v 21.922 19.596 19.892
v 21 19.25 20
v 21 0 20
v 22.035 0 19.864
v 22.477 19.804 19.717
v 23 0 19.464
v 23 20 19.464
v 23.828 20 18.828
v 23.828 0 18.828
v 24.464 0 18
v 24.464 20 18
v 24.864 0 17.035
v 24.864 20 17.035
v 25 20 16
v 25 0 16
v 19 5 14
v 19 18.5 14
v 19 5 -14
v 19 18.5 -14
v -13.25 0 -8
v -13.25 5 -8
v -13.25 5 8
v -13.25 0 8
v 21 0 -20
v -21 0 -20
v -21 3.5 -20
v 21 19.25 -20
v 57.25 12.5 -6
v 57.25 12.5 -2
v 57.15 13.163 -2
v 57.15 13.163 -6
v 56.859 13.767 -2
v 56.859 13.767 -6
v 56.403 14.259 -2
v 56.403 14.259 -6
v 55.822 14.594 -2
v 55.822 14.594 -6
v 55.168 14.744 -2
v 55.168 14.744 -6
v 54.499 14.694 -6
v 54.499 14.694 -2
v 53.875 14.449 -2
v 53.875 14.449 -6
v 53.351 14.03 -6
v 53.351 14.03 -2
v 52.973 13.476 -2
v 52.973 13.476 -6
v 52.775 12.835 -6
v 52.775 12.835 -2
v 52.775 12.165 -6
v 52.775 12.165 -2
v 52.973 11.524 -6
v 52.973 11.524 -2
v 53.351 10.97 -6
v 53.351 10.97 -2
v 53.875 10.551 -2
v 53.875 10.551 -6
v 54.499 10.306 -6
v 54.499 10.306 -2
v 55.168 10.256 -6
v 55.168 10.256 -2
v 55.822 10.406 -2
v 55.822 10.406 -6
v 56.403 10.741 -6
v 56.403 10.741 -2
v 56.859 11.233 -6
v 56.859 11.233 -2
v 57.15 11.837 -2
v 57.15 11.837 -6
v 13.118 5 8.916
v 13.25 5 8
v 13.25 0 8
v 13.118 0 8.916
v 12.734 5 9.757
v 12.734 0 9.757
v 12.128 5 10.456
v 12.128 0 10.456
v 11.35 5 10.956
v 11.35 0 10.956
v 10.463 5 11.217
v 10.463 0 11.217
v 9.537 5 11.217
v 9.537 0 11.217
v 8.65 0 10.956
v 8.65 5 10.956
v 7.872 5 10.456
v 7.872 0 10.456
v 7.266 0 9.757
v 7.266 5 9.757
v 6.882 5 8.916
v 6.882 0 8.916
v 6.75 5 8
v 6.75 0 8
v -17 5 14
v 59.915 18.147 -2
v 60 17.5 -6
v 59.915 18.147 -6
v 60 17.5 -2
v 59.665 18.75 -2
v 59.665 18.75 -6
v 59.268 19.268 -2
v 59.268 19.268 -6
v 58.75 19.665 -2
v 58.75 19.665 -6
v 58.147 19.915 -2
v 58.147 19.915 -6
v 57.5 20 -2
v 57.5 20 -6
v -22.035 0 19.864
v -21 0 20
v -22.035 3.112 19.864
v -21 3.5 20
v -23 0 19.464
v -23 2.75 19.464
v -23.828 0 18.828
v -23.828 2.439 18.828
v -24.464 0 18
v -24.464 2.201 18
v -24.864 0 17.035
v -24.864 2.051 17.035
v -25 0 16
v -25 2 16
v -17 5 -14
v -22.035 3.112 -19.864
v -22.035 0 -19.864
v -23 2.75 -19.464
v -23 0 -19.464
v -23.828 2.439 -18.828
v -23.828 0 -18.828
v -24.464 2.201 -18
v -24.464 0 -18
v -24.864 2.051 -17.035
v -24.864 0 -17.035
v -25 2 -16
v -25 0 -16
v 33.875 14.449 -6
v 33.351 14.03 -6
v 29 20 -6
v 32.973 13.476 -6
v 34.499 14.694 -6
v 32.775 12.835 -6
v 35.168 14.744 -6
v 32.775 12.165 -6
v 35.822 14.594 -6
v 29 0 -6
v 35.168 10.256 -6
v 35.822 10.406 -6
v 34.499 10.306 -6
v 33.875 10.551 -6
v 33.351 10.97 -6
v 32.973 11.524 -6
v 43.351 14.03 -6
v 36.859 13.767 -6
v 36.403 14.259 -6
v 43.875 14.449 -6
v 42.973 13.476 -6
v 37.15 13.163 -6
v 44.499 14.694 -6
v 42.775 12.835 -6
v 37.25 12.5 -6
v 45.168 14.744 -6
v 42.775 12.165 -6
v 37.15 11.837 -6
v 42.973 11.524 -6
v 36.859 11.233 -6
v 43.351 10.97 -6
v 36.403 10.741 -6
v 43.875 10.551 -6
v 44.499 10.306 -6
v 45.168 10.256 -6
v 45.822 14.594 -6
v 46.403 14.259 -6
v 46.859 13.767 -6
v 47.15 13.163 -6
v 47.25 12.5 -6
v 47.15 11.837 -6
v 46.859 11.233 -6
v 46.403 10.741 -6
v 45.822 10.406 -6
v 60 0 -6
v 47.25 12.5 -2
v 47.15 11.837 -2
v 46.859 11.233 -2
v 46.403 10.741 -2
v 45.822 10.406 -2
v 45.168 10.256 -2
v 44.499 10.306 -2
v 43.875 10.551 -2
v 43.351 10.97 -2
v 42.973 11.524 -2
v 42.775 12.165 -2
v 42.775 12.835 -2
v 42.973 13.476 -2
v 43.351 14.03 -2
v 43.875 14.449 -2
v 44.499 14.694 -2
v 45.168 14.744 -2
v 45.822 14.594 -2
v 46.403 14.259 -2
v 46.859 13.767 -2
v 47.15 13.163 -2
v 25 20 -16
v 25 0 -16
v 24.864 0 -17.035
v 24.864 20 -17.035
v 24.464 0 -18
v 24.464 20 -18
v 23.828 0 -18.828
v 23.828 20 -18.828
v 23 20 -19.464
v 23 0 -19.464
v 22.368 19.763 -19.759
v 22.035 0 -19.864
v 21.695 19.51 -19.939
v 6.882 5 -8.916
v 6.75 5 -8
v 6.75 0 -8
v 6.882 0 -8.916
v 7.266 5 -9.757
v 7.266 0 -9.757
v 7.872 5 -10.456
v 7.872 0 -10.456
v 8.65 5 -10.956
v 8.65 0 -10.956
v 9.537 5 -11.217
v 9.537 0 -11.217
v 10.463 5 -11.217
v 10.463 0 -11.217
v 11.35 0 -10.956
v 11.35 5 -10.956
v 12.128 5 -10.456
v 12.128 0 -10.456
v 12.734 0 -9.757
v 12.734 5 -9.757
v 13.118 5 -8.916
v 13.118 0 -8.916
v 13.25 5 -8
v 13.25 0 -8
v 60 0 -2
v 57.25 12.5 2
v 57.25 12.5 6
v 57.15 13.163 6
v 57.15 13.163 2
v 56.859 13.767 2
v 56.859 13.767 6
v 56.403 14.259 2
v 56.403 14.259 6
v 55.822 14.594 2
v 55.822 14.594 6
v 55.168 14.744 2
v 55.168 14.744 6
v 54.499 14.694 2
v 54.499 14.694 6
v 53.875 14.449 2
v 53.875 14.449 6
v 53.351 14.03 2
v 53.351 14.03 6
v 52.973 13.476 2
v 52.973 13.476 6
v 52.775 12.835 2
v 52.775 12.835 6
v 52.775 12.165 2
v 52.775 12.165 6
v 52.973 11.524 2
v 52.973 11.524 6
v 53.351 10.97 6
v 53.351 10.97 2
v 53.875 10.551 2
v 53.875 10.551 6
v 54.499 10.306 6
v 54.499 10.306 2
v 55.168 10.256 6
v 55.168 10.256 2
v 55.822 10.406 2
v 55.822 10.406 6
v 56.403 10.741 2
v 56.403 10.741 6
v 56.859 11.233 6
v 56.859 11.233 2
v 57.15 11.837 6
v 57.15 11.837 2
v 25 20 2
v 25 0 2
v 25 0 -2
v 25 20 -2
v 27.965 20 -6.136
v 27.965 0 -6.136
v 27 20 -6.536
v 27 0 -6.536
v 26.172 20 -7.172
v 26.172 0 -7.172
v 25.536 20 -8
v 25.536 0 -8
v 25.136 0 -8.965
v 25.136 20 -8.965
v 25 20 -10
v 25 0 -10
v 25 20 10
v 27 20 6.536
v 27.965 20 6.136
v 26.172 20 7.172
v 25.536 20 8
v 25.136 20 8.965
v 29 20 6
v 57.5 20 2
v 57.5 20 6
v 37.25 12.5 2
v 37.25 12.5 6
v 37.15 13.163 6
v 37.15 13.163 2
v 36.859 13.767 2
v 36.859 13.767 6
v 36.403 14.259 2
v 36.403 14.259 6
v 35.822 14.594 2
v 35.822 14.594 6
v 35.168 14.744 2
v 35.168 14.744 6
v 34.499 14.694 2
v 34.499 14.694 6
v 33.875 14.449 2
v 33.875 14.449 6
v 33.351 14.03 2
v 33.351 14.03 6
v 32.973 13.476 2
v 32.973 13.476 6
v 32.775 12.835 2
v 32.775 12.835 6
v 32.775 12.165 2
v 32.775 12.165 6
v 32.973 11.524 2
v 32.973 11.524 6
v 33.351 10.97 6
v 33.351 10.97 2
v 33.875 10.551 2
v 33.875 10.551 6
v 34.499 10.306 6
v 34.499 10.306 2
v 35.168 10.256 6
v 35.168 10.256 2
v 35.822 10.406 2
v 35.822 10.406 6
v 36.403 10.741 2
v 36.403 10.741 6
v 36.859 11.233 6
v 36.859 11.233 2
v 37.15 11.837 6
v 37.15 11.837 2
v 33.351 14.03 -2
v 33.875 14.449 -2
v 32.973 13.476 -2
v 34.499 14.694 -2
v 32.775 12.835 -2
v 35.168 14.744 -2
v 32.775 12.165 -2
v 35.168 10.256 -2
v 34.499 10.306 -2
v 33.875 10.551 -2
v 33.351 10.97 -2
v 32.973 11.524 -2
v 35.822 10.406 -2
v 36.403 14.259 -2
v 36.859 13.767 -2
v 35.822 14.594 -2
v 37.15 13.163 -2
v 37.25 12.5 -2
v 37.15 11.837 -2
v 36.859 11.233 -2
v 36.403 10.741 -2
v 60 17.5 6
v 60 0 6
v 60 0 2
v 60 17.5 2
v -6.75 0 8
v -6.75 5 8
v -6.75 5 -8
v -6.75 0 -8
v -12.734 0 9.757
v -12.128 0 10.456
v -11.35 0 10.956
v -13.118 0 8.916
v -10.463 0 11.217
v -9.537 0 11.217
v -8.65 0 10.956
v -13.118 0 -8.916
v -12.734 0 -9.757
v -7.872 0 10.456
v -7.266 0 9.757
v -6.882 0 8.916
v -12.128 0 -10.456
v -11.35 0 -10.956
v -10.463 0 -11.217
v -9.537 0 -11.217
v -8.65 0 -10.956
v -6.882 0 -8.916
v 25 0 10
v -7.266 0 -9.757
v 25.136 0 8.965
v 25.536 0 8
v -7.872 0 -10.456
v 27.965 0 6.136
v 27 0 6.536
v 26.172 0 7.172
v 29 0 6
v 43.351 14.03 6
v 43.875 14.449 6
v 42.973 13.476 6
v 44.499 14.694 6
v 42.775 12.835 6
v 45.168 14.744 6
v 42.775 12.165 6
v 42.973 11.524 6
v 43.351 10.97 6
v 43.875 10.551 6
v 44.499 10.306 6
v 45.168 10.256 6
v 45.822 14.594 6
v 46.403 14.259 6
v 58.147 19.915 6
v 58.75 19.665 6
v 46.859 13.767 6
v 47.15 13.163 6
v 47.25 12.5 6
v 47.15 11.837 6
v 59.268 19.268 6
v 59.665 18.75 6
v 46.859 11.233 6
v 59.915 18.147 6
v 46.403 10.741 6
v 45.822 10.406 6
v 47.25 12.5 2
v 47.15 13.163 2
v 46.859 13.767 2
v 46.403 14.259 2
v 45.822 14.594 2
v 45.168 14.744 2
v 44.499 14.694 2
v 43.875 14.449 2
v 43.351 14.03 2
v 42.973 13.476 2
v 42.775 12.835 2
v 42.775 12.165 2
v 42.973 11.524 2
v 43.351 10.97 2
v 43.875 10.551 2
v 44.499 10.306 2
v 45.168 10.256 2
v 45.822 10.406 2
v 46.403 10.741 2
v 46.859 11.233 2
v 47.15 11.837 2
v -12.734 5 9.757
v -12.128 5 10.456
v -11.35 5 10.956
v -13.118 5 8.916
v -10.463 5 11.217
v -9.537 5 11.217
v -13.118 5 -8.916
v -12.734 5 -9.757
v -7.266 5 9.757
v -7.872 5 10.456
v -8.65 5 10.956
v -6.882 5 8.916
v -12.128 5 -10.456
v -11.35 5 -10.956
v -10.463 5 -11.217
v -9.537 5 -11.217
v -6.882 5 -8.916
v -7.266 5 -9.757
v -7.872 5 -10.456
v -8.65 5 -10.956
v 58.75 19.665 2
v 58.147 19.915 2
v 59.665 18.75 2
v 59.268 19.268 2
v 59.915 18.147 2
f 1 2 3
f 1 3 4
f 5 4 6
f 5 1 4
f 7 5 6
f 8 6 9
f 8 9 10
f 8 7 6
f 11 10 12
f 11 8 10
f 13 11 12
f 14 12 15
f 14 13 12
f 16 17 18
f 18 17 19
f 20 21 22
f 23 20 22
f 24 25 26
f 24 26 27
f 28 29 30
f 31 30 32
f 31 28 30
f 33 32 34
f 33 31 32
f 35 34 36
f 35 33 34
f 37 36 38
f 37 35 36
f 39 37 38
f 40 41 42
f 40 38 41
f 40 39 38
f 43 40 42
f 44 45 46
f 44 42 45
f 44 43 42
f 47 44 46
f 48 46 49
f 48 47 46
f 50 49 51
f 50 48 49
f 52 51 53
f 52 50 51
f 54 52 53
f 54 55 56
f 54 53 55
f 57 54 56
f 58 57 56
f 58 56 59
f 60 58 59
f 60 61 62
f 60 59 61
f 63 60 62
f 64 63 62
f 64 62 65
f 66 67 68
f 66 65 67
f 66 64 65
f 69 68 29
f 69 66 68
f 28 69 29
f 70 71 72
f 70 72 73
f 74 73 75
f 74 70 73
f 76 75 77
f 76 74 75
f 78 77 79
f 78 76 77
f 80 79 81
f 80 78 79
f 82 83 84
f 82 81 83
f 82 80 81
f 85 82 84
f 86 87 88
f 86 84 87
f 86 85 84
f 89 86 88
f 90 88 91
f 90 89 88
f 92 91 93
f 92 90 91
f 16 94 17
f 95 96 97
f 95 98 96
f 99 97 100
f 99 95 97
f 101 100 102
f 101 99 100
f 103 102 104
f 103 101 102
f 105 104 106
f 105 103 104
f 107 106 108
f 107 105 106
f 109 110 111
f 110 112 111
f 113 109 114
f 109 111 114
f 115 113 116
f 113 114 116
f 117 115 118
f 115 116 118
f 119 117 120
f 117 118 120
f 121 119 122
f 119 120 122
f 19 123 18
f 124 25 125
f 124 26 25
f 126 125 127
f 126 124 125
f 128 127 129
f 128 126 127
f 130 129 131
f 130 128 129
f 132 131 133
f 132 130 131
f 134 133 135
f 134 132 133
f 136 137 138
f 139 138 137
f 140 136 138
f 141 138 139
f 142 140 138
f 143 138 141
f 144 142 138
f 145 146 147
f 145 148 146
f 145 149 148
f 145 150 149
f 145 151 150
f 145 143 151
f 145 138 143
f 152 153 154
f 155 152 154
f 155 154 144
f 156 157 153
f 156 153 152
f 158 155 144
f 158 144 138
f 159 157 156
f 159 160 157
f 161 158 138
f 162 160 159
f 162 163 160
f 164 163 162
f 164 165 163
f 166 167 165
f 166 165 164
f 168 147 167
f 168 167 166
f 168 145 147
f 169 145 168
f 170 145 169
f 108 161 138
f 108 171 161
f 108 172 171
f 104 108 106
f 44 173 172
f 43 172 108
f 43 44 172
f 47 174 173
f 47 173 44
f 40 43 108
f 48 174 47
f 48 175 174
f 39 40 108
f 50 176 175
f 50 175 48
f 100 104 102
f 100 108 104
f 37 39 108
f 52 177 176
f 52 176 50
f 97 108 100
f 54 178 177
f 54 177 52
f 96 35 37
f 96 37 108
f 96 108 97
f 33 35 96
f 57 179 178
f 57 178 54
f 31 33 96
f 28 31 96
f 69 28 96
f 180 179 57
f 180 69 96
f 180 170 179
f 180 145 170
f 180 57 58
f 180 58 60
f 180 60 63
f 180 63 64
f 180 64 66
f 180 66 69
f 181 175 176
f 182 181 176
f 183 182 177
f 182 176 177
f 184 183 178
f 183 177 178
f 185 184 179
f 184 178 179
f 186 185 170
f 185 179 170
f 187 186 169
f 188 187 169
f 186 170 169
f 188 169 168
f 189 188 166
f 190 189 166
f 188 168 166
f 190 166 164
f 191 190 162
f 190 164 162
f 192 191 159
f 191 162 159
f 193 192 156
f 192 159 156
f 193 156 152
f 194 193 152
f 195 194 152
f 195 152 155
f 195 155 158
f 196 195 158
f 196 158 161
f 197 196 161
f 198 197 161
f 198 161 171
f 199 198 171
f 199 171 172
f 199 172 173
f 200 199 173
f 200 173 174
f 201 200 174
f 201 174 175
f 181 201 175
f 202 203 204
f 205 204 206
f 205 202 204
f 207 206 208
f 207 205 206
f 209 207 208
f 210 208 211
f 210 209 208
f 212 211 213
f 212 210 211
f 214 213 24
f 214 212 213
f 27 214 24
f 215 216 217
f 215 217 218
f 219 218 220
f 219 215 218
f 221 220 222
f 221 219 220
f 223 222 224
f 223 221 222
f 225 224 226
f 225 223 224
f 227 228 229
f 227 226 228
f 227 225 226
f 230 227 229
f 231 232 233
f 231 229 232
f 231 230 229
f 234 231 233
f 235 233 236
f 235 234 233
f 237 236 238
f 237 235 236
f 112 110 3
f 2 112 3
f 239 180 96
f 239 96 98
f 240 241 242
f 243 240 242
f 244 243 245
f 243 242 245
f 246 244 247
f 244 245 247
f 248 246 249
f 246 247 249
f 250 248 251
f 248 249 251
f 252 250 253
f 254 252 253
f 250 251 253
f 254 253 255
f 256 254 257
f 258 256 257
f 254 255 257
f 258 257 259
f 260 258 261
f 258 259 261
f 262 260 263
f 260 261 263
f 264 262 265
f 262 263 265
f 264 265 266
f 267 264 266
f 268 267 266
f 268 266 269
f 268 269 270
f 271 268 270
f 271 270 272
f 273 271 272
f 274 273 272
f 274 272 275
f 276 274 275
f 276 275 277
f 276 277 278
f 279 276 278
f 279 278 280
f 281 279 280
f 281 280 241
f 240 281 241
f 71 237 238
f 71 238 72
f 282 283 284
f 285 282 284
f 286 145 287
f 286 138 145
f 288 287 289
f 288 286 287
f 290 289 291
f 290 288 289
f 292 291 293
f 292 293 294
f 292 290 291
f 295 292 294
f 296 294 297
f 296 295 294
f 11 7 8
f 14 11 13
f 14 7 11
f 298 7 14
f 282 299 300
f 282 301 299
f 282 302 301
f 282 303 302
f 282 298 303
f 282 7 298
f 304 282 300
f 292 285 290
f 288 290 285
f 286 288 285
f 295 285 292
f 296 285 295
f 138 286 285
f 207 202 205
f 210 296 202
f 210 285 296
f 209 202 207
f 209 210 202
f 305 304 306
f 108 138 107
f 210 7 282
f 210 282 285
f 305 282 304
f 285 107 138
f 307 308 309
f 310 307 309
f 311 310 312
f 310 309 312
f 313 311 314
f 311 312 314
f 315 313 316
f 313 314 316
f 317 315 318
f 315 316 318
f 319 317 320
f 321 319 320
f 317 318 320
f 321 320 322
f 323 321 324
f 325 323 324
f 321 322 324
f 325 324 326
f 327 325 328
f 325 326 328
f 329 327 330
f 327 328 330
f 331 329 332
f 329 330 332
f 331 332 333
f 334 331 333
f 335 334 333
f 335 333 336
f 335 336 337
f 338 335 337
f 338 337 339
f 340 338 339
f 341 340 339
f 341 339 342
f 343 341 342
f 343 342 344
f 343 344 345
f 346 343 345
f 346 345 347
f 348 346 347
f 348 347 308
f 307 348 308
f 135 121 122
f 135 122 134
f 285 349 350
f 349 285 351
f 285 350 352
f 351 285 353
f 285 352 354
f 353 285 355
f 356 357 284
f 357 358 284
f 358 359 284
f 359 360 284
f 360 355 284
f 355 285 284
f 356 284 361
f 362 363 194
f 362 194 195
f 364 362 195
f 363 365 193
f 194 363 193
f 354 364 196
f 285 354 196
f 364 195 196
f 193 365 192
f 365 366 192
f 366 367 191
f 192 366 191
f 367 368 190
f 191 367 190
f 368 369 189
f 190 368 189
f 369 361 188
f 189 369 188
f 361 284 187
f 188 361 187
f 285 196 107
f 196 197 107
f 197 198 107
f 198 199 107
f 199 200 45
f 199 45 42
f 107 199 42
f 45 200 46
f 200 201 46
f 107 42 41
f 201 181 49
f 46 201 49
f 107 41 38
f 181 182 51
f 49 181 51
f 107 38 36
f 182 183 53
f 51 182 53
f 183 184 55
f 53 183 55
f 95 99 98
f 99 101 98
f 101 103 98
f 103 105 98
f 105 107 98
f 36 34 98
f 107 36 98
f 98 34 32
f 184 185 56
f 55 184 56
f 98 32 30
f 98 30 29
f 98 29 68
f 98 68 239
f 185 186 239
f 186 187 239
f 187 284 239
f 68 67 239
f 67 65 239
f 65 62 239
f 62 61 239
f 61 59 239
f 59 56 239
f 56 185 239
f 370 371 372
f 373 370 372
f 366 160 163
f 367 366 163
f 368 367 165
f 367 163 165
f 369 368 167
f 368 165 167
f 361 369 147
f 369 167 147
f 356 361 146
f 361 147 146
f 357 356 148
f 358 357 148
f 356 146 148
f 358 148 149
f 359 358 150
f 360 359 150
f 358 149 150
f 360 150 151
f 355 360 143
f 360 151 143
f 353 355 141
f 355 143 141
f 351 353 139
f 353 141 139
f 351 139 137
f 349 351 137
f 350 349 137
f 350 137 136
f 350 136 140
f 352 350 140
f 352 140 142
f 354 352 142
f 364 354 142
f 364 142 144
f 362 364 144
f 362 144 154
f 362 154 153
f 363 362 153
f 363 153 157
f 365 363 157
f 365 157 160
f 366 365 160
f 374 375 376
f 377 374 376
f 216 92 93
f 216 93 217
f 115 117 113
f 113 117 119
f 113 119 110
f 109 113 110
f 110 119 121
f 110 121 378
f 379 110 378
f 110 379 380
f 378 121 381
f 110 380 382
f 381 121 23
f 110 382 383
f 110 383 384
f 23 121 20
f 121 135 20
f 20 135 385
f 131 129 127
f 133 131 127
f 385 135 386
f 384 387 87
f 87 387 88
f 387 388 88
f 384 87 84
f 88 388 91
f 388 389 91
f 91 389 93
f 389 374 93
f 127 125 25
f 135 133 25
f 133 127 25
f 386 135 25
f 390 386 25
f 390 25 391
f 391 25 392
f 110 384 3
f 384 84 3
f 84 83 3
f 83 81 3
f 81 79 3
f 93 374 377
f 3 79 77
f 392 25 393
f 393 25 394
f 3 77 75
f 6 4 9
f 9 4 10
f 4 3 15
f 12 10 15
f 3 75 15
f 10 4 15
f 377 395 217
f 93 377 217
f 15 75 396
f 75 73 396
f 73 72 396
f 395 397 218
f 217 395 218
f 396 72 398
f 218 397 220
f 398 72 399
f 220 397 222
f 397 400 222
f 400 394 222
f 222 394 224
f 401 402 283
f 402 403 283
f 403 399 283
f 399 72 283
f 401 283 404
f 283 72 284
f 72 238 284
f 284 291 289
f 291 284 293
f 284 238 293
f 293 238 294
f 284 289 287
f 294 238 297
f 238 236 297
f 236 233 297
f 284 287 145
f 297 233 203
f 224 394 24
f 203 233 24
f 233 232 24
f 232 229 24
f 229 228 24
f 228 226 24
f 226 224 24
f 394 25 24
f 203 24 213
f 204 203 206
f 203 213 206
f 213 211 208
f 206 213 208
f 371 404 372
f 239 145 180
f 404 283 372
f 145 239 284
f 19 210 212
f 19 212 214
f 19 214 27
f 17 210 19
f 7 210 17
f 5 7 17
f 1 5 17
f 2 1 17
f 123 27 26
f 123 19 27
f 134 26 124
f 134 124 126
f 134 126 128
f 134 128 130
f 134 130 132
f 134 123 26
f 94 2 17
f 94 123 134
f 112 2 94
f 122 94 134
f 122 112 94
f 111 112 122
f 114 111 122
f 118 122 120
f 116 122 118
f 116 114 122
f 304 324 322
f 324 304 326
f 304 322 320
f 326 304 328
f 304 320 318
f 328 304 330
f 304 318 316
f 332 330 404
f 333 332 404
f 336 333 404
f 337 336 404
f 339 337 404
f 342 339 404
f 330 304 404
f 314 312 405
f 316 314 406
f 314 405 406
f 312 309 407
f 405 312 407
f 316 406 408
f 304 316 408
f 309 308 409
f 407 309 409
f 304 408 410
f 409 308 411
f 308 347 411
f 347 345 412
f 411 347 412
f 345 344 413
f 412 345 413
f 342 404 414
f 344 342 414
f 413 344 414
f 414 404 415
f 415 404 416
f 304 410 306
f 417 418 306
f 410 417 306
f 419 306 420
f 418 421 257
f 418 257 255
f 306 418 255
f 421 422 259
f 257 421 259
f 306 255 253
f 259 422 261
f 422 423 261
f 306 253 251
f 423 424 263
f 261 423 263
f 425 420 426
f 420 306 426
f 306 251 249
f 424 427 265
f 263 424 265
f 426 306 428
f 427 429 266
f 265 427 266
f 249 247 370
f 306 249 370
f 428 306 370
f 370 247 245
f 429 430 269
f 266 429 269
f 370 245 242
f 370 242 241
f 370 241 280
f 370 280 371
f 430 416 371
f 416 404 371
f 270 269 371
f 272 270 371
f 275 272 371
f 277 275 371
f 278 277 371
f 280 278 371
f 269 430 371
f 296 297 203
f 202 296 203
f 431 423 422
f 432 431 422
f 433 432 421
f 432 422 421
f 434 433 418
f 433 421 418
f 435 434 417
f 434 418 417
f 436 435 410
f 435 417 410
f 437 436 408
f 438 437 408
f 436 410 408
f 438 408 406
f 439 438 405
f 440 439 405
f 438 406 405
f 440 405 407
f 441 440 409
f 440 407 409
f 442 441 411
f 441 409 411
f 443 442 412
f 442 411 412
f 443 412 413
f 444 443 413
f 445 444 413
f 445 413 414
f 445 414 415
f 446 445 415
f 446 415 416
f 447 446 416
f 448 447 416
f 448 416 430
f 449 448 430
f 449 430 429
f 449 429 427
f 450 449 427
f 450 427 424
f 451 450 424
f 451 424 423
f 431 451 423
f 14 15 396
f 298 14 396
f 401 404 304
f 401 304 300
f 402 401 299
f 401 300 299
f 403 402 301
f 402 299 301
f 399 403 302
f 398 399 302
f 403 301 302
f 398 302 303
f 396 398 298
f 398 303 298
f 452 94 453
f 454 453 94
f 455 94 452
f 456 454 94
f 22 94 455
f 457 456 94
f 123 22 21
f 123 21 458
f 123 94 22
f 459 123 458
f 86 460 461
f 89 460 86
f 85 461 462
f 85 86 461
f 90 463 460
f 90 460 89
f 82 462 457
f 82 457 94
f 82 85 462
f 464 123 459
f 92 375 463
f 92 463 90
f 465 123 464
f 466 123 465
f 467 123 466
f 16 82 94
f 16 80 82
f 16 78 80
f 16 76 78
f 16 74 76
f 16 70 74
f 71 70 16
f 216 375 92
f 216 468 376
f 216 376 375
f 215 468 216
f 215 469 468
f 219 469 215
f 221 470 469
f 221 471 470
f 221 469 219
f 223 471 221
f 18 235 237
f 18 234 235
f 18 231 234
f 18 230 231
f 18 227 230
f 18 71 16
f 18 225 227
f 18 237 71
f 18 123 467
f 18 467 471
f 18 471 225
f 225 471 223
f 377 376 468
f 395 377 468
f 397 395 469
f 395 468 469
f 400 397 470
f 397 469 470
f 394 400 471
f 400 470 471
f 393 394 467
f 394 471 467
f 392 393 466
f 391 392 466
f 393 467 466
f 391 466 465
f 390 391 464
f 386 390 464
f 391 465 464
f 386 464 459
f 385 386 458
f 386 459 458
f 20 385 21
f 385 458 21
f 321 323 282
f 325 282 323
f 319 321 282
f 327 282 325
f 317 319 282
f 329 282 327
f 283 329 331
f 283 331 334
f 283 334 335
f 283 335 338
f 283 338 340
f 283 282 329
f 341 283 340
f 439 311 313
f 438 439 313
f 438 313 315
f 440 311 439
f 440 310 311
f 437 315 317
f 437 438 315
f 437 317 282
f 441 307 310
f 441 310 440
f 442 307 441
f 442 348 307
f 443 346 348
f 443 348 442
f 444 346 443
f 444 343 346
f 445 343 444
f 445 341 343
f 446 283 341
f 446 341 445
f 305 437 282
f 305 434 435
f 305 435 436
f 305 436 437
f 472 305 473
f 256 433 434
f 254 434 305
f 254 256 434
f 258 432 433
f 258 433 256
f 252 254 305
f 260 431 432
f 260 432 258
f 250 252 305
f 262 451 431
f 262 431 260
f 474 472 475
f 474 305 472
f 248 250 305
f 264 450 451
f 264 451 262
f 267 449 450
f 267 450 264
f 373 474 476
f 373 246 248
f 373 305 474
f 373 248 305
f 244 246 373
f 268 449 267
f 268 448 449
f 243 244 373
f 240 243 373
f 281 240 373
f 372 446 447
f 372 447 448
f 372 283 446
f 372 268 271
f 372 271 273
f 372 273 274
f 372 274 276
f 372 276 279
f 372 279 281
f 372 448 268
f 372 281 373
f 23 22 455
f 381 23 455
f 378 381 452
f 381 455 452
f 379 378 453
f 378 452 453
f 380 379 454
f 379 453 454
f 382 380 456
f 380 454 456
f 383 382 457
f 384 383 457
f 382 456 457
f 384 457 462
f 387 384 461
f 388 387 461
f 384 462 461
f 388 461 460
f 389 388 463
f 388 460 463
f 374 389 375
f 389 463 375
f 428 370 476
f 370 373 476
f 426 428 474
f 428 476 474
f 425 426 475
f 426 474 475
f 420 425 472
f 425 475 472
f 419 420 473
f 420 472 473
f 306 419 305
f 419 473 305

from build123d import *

# Parameters (mm, degrees)
SKETCH1_W               = 50
SKETCH1_H               = 40
BOSS_EXTRUDE1_DEPTH     = 20
BOSS_EXTRUDE2_START     = -20
SKETCH3_W               = 35
SKETCH3_H               = 4
BOSS_EXTRUDE2_DEPTH     = 20
SKETCH4_R               = 2.25
CUT_EXTRUDE1_DEPTH      = 5
LPATTERN1_COUNT         = 3
LPATTERN1_PITCH         = 10
MIRROR1_COPY_1_SKETCH_R = 2.25
MIRROR1_COPY_1_DEPTH    = 5
MIRROR1_COPY_2_SKETCH_R = 2.25
MIRROR1_COPY_2_DEPTH    = 5
CUT_EXTRUDE2_DEPTH      = 75.833147735
CUT_EXTRUDE2_DEPTH_BACK = 75.833147735
SKETCH6_W               = 38
SKETCH6_H               = 28
CUT_EXTRUDE3_DEPTH      = 15
CUT_EXTRUDE4_DEPTH      = 66
FILLET1_R               = 2.5
FILLET2_R               = 4
FILLET3_R               = 4


with BuildPart() as part:
    # Sketch1 → Boss-Extrude1 (new body)
    with BuildSketch(Plane(origin=(0, 0, 0), x_dir=(1, 0, 0), z_dir=(0, 1, 0))):
        Rectangle(SKETCH1_W, SKETCH1_H)
    extrude(amount=BOSS_EXTRUDE1_DEPTH)

    # Sketch3 → Boss-Extrude2 (add)
    with BuildSketch(Plane(origin=(0, 20, 0), x_dir=(1, 0, 0), z_dir=(0, 1, 0)).offset(BOSS_EXTRUDE2_START)):
        with Locations((42.5, -4)):
            Rectangle(SKETCH3_W, SKETCH3_H)
    boss_extrude2 = extrude(amount=BOSS_EXTRUDE2_DEPTH)

    # Sketch4 → Cut-Extrude1 (cut)
    with BuildSketch(Plane.XY.offset(6)):
        with Locations((55, 12.5)):
            Circle(SKETCH4_R)
    cut_extrude1 = extrude(amount=-CUT_EXTRUDE1_DEPTH, mode=Mode.SUBTRACT)

    # LPattern1: Cut-Extrude1 ×3
    with Locations(*[(-i * LPATTERN1_PITCH, 0, 0) for i in range(1, LPATTERN1_COUNT)]):
        add(cut_extrude1, mode=Mode.SUBTRACT)

    # Mirror1: Boss-Extrude2, Cut-Extrude1 across plane
    add(boss_extrude2.mirror(Plane.XY))
    add(cut_extrude1.mirror(Plane.XY), mode=Mode.SUBTRACT)

    # Mirror1 copy 1 sketch → Mirror1 copy 1 (cut)
    with BuildSketch(Plane(origin=(-10, 0, -6), x_dir=(1, 0, 0), z_dir=(0, 0, -1))):
        with Locations((55, -12.5)):
            Circle(MIRROR1_COPY_1_SKETCH_R)
    extrude(amount=-MIRROR1_COPY_1_DEPTH, mode=Mode.SUBTRACT)

    # Mirror1 copy 2 sketch → Mirror1 copy 2 (cut)
    with BuildSketch(Plane(origin=(-20, 0, -6), x_dir=(1, 0, 0), z_dir=(0, 0, -1))):
        with Locations((55, -12.5)):
            Circle(MIRROR1_COPY_2_SKETCH_R)
    extrude(amount=-MIRROR1_COPY_2_DEPTH, mode=Mode.SUBTRACT)

    # Sketch5 → Cut-Extrude2 (cut, two sides)
    with BuildSketch(Plane.XY.offset(20)) as cut_extrude2_sk:
        Polygon((23, 20), (-25, 2), (-25, 20), align=None)
    extrude(amount=CUT_EXTRUDE2_DEPTH, mode=Mode.SUBTRACT)
    extrude(cut_extrude2_sk.sketch, amount=-CUT_EXTRUDE2_DEPTH_BACK, mode=Mode.SUBTRACT)

    # Sketch6 → Cut-Extrude3 (cut)
    with BuildSketch(Plane(origin=(0, 20, 0), x_dir=(1, 0, 0), z_dir=(0, 1, 0))):
        Rectangle(SKETCH6_W, SKETCH6_H)
    extrude(amount=-CUT_EXTRUDE3_DEPTH, mode=Mode.SUBTRACT)

    # Sketch7 → Cut-Extrude4 (cut, symmetric)
    with BuildSketch(Plane(origin=(0, 5, 0), x_dir=(1, 0, 0), z_dir=(0, 1, 0))):
        with BuildLine():
            Line((13.25, 8), (13.25, -8))
            ThreePointArc((13.25, -8), (10, -11.25), (6.75, -8))
            Line((6.75, -8), (6.75, 8))
            ThreePointArc((6.75, 8), (10, 11.25), (13.25, 8))
        make_face()
    cut_extrude4 = extrude(amount=CUT_EXTRUDE4_DEPTH, both=True, mode=Mode.SUBTRACT)

    # Mirror2: Cut-Extrude4 across plane
    add(cut_extrude4.mirror(Plane(origin=(0, 0, 0), x_dir=(0, 0, 1), z_dir=(1, 0, 0))), mode=Mode.SUBTRACT)

    # Fillet1
    fillet1_edges = [part.edges().sort_by_distance(p)[0] for p in [
        (60, 20, 4),
        (60, 20, -4),
    ]]
    fillet(fillet1_edges, radius=FILLET1_R)

    # Fillet2
    fillet2_edges = [part.edges().sort_by_distance(p)[0] for p in [
        (25, 10, 6),
        (25, 10, -6),
    ]]
    fillet(fillet2_edges, radius=FILLET2_R)

    # Fillet3
    fillet3_edges = [part.edges().sort_by_distance(p)[0] for p in [
        (-25, 1, -20),
        (-25, 1, 20),
        (25, 10, -20),
        (25, 10, 20),
    ]]
    fillet(fillet3_edges, radius=FILLET3_R)


solid = part.part
